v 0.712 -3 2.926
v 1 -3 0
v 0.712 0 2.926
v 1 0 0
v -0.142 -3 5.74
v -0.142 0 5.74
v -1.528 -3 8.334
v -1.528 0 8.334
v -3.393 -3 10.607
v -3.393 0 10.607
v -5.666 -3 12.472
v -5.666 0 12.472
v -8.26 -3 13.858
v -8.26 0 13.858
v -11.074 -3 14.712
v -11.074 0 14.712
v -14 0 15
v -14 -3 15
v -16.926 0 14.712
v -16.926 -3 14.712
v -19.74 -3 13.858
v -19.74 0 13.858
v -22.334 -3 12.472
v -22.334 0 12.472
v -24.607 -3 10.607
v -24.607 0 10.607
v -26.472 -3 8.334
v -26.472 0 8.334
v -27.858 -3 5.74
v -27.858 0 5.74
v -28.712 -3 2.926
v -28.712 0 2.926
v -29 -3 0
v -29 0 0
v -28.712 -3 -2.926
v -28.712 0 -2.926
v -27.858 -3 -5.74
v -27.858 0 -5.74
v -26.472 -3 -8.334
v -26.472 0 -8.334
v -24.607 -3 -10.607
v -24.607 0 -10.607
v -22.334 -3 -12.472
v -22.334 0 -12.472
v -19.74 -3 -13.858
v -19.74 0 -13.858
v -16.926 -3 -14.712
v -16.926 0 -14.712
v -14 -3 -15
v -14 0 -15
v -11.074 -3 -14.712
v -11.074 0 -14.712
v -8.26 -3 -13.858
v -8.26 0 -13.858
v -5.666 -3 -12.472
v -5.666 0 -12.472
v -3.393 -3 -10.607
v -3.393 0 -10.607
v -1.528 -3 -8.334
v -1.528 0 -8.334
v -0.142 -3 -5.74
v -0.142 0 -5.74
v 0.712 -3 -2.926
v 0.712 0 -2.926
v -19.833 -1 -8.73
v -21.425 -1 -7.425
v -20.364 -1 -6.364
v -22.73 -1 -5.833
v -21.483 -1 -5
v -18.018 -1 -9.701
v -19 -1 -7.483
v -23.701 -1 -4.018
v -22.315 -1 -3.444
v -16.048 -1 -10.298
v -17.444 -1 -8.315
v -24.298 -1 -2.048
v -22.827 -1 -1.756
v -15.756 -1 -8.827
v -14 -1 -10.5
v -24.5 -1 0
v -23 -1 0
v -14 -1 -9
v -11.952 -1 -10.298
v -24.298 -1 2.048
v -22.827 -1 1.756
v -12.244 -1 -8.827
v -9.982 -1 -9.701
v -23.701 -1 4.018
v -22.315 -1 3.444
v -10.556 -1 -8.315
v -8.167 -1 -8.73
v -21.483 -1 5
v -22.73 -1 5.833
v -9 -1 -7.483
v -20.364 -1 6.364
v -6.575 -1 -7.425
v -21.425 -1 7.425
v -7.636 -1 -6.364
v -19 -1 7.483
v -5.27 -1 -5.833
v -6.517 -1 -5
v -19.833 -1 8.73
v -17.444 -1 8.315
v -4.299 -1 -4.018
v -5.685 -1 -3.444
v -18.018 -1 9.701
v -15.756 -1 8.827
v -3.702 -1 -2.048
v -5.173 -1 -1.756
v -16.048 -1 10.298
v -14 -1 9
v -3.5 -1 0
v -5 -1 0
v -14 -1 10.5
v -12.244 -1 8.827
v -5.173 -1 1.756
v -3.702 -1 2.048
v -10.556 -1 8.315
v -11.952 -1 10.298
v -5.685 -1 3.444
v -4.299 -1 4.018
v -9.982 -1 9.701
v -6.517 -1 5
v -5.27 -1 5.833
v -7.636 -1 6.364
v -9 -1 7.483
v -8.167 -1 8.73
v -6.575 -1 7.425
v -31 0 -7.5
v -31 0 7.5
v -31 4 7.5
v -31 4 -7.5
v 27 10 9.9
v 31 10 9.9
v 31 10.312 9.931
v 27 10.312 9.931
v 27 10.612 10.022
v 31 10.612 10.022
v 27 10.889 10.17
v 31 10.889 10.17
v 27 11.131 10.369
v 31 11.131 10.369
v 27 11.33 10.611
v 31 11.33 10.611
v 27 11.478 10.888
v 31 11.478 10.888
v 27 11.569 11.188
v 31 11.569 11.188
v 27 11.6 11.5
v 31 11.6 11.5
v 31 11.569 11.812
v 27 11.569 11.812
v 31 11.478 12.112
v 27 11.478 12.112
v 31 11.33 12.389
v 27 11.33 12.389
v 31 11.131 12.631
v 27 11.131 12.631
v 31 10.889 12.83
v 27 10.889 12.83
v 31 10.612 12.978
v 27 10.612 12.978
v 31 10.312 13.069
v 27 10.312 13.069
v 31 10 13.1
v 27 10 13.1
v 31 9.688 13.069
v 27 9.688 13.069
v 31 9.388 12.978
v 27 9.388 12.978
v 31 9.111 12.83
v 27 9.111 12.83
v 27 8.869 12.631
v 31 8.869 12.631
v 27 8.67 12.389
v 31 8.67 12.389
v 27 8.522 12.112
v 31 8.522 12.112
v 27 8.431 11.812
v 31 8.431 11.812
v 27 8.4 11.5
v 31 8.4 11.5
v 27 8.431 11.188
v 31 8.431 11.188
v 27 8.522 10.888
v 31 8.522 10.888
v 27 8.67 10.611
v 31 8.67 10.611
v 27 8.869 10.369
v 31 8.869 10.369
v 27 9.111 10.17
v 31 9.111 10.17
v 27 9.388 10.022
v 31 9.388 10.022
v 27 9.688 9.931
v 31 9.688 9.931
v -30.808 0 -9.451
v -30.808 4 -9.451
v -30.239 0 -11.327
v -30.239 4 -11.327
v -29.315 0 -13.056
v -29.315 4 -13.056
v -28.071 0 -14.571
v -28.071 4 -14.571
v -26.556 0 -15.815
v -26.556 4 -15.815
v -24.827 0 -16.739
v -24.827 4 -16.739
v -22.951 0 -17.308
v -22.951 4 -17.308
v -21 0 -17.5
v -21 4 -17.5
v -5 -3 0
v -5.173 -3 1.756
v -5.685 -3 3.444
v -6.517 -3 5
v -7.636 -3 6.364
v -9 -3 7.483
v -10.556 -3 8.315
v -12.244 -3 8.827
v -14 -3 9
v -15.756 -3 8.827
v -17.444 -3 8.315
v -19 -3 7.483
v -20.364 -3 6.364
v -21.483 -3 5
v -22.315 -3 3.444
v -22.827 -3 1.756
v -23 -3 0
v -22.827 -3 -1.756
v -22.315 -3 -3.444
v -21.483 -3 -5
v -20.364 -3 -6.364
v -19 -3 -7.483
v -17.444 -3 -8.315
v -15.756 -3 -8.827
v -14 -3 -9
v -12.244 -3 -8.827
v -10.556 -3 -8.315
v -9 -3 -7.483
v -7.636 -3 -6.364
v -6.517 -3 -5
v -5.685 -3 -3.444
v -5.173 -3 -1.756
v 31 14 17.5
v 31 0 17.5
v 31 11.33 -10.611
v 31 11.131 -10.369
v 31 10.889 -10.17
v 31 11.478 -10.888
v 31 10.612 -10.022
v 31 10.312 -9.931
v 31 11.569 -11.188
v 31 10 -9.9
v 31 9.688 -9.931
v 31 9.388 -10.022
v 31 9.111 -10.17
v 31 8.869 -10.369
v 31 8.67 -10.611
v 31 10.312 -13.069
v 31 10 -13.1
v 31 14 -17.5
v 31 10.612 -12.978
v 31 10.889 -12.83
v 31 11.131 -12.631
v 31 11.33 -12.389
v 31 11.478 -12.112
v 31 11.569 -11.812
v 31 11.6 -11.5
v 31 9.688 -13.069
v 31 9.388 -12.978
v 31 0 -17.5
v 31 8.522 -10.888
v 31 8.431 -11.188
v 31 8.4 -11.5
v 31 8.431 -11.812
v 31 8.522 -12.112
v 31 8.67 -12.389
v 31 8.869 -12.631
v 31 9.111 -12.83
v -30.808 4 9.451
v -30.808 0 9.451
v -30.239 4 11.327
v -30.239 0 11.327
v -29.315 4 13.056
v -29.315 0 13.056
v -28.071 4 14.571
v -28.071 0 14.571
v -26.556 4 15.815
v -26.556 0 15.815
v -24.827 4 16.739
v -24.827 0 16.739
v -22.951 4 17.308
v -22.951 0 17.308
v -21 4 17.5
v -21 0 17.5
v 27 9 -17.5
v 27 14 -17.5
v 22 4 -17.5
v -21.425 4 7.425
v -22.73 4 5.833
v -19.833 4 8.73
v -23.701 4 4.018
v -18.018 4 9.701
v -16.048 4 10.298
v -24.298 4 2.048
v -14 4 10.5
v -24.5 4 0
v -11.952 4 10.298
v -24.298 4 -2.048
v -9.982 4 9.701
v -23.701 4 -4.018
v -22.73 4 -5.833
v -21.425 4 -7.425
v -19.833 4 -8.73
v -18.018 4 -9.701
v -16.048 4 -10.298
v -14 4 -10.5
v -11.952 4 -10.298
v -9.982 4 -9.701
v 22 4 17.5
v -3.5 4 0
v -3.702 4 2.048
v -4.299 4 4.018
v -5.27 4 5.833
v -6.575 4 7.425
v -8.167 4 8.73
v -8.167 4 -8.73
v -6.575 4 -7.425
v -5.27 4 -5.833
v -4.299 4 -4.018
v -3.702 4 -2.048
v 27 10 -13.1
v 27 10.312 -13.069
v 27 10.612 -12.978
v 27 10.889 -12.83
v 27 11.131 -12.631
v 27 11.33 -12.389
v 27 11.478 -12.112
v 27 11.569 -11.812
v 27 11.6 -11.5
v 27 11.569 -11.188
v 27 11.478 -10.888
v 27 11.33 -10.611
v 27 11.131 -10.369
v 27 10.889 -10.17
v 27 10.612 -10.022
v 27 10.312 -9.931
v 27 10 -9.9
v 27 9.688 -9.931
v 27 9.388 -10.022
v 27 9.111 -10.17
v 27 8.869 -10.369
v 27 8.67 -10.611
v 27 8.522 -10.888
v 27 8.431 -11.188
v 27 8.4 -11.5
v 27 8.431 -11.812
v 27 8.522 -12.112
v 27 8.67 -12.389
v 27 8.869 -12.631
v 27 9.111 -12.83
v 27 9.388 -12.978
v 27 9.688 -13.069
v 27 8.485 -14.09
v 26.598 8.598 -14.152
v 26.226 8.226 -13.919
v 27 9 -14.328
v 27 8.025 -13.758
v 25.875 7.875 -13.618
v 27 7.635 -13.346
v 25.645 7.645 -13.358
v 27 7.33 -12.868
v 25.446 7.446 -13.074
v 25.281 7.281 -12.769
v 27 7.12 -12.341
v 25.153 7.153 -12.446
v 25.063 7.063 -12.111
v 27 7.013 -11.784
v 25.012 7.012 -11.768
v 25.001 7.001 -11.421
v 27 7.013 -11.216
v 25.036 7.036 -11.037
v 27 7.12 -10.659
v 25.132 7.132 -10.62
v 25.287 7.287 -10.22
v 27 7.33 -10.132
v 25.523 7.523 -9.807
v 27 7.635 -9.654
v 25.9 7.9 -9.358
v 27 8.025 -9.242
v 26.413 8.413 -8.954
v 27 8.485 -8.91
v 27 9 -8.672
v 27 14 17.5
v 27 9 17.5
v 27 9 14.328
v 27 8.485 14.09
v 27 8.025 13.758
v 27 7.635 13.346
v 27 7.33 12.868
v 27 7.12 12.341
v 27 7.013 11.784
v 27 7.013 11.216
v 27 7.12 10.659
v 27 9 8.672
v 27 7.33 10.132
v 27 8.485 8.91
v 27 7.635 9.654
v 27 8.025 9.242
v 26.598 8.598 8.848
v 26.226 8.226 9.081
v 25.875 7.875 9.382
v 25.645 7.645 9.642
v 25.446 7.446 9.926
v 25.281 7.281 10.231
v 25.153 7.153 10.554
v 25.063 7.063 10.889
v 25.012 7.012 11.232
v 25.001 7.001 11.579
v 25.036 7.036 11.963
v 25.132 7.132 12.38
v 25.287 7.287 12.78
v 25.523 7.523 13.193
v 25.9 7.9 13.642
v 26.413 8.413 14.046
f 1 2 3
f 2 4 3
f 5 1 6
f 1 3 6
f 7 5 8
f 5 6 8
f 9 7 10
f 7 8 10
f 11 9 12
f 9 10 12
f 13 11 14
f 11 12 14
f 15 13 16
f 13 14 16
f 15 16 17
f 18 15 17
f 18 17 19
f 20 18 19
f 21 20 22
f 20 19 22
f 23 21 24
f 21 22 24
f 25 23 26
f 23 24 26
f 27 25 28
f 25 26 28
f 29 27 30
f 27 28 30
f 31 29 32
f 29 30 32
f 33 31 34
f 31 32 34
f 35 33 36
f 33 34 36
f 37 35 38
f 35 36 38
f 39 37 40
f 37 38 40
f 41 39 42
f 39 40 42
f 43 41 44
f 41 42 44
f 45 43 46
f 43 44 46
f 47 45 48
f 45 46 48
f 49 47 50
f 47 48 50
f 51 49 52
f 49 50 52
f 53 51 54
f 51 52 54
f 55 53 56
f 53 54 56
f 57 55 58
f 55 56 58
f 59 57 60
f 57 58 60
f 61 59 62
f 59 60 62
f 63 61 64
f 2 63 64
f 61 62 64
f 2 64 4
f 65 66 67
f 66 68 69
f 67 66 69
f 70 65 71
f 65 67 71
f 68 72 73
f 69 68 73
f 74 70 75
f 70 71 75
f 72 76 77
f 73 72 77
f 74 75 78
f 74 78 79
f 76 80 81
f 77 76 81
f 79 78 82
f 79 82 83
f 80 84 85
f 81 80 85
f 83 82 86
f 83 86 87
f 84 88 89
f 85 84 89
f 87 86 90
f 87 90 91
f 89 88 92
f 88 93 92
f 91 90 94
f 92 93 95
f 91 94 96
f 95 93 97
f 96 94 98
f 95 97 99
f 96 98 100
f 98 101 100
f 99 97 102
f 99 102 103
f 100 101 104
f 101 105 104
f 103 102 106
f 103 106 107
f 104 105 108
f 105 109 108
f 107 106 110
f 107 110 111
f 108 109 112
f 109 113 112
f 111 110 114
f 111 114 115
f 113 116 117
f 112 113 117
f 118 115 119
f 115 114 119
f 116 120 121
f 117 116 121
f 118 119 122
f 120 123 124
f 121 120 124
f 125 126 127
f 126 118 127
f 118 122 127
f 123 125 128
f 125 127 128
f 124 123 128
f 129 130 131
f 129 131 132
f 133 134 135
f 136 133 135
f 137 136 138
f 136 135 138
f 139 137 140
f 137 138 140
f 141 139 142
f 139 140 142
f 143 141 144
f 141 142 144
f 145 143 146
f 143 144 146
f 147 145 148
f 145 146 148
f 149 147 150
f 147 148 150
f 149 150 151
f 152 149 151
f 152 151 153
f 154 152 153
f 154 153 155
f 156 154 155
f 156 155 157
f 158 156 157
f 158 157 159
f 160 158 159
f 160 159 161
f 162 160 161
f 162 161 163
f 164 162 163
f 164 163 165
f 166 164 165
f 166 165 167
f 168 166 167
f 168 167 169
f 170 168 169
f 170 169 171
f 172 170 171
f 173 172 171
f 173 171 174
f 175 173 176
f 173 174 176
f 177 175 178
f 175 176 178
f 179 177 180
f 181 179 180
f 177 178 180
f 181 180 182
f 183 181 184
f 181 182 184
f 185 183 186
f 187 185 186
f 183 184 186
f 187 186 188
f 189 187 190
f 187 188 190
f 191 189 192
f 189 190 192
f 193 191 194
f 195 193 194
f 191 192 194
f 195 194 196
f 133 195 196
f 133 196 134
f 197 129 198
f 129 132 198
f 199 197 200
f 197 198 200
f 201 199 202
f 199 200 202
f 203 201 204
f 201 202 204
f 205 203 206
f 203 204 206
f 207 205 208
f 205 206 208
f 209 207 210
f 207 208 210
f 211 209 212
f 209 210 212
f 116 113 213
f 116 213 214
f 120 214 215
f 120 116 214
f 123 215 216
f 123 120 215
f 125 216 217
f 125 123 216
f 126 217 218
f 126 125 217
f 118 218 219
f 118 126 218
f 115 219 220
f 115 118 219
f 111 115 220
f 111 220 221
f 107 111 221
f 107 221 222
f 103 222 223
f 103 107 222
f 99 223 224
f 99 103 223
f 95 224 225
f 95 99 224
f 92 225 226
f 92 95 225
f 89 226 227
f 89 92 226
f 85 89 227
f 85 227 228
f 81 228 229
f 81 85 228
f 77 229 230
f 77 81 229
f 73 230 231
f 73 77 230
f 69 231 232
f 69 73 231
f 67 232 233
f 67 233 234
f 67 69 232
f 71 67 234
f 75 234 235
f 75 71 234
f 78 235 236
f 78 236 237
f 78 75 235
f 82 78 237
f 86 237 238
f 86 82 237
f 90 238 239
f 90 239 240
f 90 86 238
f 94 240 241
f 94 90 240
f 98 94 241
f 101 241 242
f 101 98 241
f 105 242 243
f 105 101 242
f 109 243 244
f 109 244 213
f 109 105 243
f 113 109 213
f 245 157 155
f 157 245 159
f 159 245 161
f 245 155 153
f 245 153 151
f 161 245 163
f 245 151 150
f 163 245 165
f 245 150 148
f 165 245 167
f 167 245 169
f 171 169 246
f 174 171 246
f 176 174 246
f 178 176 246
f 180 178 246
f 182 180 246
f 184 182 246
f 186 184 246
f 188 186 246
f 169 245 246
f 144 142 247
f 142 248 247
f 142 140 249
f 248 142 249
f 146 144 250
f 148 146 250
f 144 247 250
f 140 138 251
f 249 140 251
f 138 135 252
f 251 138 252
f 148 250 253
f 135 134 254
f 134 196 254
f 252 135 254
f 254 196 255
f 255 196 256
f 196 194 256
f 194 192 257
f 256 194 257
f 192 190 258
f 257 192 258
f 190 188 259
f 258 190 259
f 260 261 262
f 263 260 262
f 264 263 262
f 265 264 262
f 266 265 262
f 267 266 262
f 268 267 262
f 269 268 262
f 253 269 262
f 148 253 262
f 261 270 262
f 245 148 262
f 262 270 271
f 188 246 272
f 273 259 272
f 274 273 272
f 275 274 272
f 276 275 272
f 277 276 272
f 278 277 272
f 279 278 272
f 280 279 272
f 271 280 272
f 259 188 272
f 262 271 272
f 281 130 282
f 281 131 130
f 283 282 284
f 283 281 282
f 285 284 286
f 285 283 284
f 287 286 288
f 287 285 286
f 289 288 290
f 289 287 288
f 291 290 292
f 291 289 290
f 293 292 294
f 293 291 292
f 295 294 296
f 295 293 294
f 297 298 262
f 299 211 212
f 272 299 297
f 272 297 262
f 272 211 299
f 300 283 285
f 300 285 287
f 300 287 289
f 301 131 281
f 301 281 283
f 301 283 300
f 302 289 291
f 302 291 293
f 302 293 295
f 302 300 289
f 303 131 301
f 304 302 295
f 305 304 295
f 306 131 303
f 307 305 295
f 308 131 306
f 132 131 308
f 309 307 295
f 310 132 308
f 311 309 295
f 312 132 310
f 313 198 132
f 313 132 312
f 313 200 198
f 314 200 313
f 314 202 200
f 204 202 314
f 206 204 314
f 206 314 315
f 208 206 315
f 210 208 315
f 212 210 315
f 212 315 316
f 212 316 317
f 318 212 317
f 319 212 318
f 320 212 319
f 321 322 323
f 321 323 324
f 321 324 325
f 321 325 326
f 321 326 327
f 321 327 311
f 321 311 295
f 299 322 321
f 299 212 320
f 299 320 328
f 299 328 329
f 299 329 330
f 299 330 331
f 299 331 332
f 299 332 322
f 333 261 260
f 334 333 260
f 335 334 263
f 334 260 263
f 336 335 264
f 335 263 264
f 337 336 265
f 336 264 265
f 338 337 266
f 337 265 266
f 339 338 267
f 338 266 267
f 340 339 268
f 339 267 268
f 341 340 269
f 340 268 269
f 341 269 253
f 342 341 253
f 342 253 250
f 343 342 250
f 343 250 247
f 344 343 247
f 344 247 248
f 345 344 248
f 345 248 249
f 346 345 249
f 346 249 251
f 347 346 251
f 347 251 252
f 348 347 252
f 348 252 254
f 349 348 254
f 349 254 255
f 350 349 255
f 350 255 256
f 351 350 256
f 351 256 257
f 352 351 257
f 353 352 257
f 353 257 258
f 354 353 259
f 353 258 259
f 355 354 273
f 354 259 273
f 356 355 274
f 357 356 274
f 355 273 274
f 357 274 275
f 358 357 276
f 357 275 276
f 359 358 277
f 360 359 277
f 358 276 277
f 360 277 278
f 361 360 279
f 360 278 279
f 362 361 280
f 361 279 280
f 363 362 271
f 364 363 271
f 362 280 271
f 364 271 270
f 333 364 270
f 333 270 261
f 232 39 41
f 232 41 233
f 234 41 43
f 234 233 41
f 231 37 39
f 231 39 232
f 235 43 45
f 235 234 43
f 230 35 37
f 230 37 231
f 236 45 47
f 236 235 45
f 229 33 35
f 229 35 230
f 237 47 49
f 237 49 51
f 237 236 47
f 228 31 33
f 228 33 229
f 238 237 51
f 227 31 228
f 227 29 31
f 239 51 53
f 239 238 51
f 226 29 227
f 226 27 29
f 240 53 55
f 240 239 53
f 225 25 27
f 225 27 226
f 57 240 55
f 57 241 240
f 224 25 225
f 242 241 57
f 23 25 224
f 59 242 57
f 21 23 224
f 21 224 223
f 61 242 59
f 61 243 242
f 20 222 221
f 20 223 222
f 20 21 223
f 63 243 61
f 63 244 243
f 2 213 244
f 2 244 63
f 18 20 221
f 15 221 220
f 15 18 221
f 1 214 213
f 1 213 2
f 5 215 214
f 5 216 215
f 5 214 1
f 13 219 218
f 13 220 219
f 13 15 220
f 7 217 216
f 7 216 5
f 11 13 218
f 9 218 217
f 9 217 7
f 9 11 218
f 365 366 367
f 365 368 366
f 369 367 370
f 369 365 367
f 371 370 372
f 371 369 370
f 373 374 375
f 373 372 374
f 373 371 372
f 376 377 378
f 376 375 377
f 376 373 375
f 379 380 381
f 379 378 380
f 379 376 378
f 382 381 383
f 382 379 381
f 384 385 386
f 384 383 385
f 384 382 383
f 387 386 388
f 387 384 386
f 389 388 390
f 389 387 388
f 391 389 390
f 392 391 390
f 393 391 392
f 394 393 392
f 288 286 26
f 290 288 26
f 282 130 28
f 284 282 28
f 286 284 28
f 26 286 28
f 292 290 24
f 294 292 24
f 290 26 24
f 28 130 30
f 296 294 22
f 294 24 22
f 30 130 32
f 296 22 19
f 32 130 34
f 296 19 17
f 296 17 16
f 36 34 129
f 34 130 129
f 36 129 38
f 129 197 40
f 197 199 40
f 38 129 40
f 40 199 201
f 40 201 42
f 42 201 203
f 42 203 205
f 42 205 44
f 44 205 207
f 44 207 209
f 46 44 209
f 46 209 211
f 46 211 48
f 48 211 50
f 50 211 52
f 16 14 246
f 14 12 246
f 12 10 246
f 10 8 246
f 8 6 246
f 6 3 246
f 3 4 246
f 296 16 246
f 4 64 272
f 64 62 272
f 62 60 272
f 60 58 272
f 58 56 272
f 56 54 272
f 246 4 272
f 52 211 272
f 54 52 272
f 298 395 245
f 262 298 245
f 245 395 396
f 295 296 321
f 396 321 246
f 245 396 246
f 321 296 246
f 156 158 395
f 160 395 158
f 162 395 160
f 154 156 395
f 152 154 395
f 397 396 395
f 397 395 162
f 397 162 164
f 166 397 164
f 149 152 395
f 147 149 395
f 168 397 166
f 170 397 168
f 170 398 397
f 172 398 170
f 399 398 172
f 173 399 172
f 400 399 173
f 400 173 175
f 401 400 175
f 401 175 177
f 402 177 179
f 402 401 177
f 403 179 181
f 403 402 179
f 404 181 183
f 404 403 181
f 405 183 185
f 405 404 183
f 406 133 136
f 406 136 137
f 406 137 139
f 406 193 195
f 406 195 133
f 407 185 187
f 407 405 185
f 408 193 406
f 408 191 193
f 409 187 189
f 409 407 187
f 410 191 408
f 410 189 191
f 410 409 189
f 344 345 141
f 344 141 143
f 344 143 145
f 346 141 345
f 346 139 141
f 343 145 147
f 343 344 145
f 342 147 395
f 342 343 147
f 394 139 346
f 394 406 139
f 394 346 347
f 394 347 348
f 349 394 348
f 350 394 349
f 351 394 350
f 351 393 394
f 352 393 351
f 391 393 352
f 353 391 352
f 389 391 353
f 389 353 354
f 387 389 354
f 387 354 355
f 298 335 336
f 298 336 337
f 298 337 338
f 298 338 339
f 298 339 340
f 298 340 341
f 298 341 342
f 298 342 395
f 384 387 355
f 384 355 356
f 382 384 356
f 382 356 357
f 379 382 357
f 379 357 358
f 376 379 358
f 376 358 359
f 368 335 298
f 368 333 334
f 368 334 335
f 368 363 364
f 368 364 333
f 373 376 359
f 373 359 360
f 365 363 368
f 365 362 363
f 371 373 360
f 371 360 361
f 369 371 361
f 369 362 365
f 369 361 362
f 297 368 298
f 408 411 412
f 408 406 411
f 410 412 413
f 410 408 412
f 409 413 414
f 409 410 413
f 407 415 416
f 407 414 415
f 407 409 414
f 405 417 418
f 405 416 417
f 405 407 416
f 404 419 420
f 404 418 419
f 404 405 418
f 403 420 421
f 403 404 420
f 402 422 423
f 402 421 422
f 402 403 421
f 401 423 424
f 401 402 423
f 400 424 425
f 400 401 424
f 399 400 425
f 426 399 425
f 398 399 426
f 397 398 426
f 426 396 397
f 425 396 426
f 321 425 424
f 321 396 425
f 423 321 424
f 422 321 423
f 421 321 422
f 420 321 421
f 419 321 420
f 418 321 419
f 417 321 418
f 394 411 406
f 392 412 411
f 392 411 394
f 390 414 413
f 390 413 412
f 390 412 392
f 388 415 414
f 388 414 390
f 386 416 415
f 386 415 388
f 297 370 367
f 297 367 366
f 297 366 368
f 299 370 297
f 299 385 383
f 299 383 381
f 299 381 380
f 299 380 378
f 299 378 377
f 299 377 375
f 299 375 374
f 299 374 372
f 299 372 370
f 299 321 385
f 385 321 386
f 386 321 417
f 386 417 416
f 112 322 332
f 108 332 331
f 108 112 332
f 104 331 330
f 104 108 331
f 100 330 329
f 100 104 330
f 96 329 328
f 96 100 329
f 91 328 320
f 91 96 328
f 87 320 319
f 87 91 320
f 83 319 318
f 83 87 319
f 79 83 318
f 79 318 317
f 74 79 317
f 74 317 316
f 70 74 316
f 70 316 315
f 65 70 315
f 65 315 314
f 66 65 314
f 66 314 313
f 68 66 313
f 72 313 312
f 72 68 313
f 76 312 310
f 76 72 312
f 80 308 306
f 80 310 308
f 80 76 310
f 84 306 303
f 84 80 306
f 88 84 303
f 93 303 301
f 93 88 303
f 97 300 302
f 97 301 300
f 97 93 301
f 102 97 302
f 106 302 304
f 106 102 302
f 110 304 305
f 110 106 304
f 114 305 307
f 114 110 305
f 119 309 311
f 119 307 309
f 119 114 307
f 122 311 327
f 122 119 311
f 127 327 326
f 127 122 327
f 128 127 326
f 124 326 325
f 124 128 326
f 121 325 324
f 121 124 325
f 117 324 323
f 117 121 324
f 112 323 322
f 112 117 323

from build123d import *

# Parameters (mm, degrees)
SKETCH_1_W           = 62
SKETCH_1_H           = 35
SKETCH_1_R           = 10.5
EXTRUDE_1_DEPTH      = 4
SKETCH_3_R           = 15
SKETCH_3_R_2         = 10.5
EXTRUDE_2_DEPTH      = 5
EXTRUDE_2_DEPTH_BACK = 1
FILLET_1_R           = 10
SKETCH_4_W           = 4
SKETCH_4_H           = 35
EXTRUDE_3_DEPTH      = 10
CHAMFER_1_SIZE       = 5
SKETCH_5_R           = 1.6
CUT_EXTRUDE_1_DEPTH  = 25
SKETCH_6_R           = 3
CUT_EXTRUDE_2_DEPTH  = 25
SKETCH_7_W           = 33.228870124
SKETCH_7_H           = 2.665820387
CUT_EXTRUDE_3_DEPTH  = 50
SKETCH_8_R           = 15
SKETCH_8_R_2         = 9
EXTRUDE_4_DEPTH      = 2


with BuildPart() as part:
    # Эскиз1 → Бобышка-Вытянуть1 (new body)
    with BuildSketch(Plane(origin=(0, 0, 0), x_dir=(1, 0, 0), z_dir=(0, 1, 0))):
        Rectangle(SKETCH_1_W, SKETCH_1_H)
        with Locations((-14, 0)):
            Circle(SKETCH_1_R, mode=Mode.SUBTRACT)
    extrude(amount=EXTRUDE_1_DEPTH)

    # Эскиз3 → Бобышка-Вытянуть2 (add, two sides)
    with BuildSketch(Plane(origin=(0, 0, 0), x_dir=(1, 0, 0), z_dir=(0, 1, 0))) as extrude_2_sk:
        with Locations((-14, 0)):
            Circle(SKETCH_3_R)
        with Locations((-14, 0)):
            Circle(SKETCH_3_R_2, mode=Mode.SUBTRACT)
    extrude(amount=EXTRUDE_2_DEPTH)
    extrude(extrude_2_sk.sketch, amount=-EXTRUDE_2_DEPTH_BACK)

    # Скругление1
    fillet_1_edges = [part.edges().sort_by_distance(p)[0] for p in [
        (-31, 2, -17.5),
        (-31, 2, 17.5),
    ]]
    fillet(fillet_1_edges, radius=FILLET_1_R)

    # Эскиз4 → Бобышка-Вытянуть3 (add)
    with BuildSketch(Plane(origin=(0, 4, 0), x_dir=(1, 0, 0), z_dir=(0, 1, 0))):
        with Locations((29, 0)):
            Rectangle(SKETCH_4_W, SKETCH_4_H)
    extrude(amount=EXTRUDE_3_DEPTH)

    # Фаска1
    chamfer_1_edges = [part.edges().sort_by_distance(p)[0] for p in [
        (27, 4, 0),
    ]]
    chamfer(chamfer_1_edges, length=CHAMFER_1_SIZE)

    # Эскиз5 → Вырез-Вытянуть1 (cut)
    with BuildSketch(Plane(origin=(31, 0, 0), x_dir=(0, 0, -1), z_dir=(1, 0, 0))):
        with Locations((-11.5, 10)):
            Circle(SKETCH_5_R)
        with Locations((11.5, 10)):
            Circle(SKETCH_5_R)
    extrude(amount=-CUT_EXTRUDE_1_DEPTH, mode=Mode.SUBTRACT)

    # Эскиз6 → Вырез-Вытянуть2 (cut)
    with BuildSketch(Plane.ZY.offset(-27)):
        with Locations((-11.5, 10)):
            Circle(SKETCH_6_R)
        with Locations((11.5, 10)):
            Circle(SKETCH_6_R)
    extrude(amount=CUT_EXTRUDE_2_DEPTH, mode=Mode.SUBTRACT)

    # Эскиз7 → Вырез-Вытянуть3 (cut)
    with BuildSketch(Plane.XY.offset(17.5)):
        with Locations((-14.385564938, 5.332910194)):
            Rectangle(SKETCH_7_W, SKETCH_7_H)
    extrude(amount=-CUT_EXTRUDE_3_DEPTH, mode=Mode.SUBTRACT)

    # Эскиз8 → Бобышка-Вытянуть4 (add)
    with BuildSketch(Plane.XZ.offset(1)):
        with Locations((-14, 0)):
            Circle(SKETCH_8_R)
        with Locations((-14, 0)):
            Circle(SKETCH_8_R_2, mode=Mode.SUBTRACT)
    extrude(amount=EXTRUDE_4_DEPTH)


solid = part.part
